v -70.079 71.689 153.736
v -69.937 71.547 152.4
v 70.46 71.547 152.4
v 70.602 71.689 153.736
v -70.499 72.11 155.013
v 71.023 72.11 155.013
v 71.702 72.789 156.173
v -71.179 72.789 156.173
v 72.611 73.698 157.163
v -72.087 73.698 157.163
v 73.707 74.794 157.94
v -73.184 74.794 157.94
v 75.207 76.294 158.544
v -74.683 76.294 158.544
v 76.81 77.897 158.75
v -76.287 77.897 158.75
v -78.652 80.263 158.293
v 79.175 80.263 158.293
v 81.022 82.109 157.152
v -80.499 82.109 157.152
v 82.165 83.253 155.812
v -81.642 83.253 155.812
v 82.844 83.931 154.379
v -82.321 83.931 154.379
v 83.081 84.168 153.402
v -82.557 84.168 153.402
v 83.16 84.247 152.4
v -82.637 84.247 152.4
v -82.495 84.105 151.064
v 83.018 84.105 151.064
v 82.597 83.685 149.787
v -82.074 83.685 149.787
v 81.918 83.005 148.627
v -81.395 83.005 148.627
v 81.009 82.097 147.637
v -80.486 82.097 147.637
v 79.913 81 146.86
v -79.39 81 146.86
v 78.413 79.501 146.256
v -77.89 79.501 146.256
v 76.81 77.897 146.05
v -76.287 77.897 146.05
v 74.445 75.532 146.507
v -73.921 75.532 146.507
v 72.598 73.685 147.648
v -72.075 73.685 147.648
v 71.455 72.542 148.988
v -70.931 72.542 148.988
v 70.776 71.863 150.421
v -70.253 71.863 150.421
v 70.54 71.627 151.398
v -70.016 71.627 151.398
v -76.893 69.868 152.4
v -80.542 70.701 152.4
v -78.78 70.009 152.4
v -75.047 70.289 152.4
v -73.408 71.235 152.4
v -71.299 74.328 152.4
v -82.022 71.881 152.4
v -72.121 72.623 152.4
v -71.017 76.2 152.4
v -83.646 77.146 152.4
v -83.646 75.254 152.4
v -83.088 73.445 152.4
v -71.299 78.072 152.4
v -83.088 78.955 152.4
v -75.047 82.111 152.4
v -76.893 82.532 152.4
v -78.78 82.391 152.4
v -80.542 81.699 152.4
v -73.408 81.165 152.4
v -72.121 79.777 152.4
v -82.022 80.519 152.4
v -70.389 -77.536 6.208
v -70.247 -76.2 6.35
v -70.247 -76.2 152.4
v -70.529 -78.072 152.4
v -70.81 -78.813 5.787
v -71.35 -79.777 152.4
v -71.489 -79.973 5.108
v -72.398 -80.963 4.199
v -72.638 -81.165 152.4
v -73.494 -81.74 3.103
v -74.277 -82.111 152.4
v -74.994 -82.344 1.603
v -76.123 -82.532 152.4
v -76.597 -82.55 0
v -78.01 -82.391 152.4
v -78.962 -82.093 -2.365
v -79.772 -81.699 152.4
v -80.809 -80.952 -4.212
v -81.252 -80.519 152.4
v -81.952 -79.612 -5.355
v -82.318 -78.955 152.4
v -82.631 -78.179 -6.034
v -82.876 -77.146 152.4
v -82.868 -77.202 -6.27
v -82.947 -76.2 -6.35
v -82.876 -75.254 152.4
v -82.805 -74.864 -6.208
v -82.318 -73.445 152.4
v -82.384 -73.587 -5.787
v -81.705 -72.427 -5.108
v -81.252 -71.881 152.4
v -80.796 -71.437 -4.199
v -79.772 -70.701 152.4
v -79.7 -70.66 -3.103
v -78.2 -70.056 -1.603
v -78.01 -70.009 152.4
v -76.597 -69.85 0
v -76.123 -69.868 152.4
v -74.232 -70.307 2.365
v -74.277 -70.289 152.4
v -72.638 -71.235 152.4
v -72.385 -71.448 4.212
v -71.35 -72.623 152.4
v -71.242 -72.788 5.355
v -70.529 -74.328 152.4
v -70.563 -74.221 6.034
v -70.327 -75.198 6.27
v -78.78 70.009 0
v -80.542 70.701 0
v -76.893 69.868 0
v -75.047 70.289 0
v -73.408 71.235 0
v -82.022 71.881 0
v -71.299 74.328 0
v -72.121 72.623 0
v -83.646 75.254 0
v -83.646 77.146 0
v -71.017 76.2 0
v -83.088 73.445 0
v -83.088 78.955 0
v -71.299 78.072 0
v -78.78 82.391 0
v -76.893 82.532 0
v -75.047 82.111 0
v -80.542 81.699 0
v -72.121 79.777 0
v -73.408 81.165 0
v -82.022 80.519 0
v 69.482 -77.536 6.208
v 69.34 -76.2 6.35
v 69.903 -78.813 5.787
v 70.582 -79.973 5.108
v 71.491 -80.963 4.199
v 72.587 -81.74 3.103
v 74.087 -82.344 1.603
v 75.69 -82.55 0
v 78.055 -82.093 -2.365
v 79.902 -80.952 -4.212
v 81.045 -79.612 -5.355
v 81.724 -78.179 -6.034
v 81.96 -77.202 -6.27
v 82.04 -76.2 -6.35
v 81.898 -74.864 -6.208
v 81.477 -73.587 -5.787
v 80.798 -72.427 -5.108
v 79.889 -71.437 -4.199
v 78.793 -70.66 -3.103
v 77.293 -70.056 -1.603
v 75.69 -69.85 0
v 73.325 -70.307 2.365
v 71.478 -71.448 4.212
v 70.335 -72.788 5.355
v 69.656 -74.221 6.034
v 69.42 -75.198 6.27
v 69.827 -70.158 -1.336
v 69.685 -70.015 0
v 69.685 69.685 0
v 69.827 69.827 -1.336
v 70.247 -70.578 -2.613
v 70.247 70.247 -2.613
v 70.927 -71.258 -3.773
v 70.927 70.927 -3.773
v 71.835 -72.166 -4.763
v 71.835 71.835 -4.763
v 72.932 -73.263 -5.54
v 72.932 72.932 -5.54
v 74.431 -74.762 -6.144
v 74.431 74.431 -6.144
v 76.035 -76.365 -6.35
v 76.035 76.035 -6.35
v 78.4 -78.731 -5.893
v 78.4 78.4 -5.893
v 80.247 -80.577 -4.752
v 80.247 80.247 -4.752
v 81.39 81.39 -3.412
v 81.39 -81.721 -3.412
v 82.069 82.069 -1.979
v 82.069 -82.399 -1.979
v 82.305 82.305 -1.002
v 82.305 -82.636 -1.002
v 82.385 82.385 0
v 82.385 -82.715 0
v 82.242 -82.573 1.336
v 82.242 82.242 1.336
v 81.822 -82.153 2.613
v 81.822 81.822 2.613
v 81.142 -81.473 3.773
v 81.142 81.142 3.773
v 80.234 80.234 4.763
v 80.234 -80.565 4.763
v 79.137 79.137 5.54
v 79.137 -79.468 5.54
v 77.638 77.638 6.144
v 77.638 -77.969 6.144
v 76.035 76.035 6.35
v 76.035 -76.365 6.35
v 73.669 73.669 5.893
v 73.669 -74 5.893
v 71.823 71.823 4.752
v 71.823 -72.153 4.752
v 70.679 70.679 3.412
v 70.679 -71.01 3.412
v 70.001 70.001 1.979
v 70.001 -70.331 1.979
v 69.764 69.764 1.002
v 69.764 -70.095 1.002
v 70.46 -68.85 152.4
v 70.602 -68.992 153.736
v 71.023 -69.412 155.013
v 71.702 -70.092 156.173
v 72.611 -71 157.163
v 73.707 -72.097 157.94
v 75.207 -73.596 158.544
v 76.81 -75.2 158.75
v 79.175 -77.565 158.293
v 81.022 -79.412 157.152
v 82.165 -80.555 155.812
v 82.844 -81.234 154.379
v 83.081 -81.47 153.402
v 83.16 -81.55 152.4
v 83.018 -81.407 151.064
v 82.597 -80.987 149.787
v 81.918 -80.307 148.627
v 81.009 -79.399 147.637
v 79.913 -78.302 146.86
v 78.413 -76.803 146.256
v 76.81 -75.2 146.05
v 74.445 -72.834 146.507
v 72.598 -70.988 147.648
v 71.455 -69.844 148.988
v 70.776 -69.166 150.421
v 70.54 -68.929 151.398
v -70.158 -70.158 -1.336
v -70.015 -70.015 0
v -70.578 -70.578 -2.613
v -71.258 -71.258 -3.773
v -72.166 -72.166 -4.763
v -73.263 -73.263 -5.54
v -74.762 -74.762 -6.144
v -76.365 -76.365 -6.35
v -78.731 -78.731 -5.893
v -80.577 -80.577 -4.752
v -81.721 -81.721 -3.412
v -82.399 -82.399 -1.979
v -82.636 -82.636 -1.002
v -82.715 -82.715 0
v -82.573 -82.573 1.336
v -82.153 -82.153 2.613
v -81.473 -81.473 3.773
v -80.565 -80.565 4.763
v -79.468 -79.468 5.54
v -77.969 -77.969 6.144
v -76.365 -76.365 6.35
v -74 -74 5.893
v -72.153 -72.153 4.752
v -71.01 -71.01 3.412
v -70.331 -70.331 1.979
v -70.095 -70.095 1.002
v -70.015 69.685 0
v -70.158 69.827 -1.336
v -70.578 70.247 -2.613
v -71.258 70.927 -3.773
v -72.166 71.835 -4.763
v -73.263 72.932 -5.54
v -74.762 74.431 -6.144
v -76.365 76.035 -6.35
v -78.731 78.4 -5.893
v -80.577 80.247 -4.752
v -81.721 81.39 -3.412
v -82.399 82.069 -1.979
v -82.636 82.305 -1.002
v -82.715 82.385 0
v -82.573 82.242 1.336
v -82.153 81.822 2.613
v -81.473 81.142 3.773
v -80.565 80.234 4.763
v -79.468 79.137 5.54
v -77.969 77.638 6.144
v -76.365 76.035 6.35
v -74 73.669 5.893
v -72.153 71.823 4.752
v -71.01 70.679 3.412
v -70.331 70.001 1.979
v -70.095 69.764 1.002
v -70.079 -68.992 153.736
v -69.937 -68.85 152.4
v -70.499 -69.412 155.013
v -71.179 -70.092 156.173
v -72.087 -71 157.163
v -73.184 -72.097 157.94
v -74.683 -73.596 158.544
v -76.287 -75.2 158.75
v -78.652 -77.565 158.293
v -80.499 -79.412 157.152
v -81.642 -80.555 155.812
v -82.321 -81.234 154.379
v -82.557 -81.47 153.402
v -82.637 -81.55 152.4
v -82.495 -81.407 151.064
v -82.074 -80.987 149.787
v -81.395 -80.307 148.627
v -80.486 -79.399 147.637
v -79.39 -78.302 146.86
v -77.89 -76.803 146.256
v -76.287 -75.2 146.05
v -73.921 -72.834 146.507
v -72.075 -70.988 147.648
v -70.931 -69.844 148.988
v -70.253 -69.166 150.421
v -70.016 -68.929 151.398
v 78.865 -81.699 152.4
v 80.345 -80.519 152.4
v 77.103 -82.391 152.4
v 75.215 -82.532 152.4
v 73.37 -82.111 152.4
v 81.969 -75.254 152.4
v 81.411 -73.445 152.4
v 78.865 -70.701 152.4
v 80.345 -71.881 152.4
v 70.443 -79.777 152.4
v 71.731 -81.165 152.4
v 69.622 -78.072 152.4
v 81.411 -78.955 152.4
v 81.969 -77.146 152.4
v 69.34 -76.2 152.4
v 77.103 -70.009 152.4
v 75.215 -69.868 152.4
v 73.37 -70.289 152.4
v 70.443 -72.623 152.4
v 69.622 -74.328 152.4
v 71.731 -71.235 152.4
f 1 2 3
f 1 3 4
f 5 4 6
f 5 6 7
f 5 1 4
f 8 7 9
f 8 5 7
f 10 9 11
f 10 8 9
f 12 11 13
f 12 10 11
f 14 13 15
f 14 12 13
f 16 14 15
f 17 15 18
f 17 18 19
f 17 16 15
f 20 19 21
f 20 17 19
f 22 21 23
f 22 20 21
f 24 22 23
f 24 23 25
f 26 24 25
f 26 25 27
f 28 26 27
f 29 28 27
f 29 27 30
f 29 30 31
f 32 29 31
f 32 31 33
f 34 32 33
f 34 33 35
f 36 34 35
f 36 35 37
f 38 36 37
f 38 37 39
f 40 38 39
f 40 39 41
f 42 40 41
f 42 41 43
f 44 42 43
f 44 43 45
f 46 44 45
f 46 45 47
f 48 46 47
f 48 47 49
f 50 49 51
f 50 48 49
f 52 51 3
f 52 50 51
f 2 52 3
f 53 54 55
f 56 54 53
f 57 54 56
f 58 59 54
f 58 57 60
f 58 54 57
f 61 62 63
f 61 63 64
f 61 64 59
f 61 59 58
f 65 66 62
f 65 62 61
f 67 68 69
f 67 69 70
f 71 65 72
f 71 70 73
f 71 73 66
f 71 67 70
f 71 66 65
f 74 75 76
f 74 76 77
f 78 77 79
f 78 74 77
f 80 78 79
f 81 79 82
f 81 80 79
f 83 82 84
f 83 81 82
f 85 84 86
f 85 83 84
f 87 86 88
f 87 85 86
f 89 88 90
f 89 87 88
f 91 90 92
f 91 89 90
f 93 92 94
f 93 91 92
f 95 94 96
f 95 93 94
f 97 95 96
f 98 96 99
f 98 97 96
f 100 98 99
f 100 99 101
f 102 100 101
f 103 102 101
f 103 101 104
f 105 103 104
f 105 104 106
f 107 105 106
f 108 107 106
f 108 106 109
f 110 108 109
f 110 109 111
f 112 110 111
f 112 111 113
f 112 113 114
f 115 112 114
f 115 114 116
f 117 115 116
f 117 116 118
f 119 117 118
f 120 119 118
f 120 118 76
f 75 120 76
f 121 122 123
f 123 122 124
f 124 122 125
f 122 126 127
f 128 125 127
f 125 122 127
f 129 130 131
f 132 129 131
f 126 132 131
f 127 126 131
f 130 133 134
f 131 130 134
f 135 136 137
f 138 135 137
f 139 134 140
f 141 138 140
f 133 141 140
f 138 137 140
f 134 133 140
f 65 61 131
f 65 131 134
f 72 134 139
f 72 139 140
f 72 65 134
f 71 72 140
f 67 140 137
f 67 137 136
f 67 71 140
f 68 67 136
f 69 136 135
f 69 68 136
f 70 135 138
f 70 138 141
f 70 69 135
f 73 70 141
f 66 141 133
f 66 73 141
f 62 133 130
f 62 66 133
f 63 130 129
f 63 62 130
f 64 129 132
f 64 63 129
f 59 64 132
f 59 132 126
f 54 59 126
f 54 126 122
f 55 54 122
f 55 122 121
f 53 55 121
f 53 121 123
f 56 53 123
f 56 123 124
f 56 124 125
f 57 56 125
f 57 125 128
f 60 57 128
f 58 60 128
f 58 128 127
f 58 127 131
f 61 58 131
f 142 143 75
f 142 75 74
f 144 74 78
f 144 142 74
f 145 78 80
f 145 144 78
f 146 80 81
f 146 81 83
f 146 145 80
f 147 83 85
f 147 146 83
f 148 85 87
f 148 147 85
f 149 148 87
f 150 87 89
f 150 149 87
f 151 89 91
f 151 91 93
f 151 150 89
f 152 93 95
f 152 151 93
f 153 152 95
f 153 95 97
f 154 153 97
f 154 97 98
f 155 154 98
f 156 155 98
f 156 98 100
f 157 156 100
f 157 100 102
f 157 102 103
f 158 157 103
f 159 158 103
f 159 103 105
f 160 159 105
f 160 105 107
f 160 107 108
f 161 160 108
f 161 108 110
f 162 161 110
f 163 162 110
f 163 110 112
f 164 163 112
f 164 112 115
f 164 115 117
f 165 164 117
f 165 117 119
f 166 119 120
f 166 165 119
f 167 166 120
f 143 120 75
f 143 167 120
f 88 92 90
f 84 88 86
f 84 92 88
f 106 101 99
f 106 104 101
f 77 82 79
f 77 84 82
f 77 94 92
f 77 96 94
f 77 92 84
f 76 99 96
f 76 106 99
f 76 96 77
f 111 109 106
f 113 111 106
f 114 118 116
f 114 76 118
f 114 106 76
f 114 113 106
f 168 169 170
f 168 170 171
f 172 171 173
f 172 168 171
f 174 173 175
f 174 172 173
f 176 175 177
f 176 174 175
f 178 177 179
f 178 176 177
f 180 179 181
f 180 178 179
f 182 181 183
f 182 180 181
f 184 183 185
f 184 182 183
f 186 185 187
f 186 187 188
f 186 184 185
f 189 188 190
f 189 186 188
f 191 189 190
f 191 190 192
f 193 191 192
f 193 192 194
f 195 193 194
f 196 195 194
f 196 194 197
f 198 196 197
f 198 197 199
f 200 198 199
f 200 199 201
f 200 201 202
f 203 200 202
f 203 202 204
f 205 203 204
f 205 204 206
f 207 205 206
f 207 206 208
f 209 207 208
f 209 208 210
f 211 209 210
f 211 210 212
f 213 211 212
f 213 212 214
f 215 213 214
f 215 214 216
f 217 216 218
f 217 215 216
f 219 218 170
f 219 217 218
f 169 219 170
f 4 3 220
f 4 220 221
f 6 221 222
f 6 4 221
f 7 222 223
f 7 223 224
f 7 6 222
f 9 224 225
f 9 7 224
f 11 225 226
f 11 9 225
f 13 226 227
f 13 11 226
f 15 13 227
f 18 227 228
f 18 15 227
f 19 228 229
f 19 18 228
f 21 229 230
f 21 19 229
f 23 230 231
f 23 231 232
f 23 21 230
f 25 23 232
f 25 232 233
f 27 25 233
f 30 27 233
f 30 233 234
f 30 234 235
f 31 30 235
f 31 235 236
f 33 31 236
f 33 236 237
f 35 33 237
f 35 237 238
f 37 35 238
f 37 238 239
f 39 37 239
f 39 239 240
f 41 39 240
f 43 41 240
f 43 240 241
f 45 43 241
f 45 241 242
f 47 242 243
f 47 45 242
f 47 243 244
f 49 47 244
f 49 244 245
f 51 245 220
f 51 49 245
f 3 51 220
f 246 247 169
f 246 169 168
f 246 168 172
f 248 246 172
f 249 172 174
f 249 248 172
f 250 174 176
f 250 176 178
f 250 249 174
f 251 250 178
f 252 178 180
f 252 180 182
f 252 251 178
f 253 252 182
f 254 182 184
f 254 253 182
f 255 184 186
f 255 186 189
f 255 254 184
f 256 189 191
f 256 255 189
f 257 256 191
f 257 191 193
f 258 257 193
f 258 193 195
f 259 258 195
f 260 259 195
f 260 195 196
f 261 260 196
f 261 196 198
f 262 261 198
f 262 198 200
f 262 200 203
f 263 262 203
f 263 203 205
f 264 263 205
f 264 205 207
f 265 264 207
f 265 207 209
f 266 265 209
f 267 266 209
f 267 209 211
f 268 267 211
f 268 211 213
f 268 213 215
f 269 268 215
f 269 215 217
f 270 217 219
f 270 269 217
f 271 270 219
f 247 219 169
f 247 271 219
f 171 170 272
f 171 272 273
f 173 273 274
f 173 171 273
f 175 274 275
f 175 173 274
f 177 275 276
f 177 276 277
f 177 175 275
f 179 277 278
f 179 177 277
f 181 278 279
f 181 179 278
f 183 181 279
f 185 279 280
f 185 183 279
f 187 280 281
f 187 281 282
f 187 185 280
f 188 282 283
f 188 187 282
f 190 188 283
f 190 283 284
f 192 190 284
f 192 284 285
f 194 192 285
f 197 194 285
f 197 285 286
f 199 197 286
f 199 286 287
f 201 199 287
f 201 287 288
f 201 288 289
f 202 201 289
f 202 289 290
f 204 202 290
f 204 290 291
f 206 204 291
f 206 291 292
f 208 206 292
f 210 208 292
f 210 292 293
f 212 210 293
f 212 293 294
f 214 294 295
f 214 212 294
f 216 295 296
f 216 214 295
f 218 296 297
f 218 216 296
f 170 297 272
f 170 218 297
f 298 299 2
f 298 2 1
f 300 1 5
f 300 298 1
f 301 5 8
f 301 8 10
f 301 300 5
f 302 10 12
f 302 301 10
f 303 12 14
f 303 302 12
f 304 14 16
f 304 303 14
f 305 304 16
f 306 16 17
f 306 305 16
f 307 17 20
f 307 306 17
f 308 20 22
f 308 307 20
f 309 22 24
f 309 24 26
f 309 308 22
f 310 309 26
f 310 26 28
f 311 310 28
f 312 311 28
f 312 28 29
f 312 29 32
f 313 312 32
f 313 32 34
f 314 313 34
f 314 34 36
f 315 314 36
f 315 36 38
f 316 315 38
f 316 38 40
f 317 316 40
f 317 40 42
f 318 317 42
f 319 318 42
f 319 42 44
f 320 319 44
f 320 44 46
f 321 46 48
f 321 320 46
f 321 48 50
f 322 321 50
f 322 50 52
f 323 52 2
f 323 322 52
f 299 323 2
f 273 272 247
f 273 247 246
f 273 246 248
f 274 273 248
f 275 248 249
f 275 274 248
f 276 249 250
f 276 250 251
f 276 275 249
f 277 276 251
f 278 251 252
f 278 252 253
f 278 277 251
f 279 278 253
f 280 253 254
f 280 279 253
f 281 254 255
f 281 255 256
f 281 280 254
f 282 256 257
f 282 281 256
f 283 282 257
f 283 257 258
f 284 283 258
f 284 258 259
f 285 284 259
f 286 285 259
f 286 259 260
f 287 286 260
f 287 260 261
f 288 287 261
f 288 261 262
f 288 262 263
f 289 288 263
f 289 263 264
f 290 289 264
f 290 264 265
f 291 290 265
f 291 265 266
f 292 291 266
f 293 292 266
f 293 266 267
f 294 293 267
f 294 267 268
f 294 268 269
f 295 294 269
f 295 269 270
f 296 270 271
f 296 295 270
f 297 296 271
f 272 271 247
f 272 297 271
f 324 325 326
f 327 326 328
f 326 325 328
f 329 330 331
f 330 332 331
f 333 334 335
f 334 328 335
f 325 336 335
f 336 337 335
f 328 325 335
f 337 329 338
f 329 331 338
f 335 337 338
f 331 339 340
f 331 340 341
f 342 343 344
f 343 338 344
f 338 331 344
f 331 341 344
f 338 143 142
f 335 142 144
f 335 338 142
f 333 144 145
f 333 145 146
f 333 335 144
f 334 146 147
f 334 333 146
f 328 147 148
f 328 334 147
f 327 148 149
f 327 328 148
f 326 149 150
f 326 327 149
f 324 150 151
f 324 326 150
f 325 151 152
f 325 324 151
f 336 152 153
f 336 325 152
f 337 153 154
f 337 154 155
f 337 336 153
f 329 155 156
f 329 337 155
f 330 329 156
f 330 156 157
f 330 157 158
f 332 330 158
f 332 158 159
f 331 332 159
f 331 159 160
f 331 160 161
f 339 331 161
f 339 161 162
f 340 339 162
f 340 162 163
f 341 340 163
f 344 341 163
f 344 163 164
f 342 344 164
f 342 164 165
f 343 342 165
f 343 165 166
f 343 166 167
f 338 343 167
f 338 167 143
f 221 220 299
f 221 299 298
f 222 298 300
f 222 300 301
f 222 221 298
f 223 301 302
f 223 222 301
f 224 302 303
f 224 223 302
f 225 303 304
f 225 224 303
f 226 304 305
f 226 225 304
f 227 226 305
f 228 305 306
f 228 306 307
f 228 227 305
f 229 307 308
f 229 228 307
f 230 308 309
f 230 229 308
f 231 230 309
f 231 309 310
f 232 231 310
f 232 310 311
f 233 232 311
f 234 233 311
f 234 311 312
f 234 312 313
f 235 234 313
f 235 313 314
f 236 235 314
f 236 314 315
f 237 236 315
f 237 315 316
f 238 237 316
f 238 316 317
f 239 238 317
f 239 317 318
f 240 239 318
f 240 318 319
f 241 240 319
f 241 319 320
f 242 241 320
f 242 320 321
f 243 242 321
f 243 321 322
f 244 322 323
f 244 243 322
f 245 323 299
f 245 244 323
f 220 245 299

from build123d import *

# Parameters (mm, degrees)
F1_R  = 6.35
F6_R  = 6.35
F9_R  = 6.35
F13_R = 6.35


with BuildPart() as f2:
    # F2: sweep along a path in F0
    with BuildLine(Plane.XY) as f2_path:
        Line((-76.3653023233, 76.034690243), (76.0346976767, 76.034690243))
        Line((76.0346976767, 76.034690243), (76.0346976767, -76.365309757))
        Line((76.0346976767, -76.365309757), (-76.3653023233, -76.365309757))
        Line((-76.3653023233, -76.365309757), (-76.3653023233, 76.034690243))
    # F1 (on Front) → F2 (sweep)
    with BuildSketch(Plane.XZ):
        with Locations((-76.3653023233, 0)):
            Circle(F1_R)
    sweep(path=f2_path.line, transition=Transition.RIGHT)


with BuildPart() as f7:
    # F7: sweep along a path in F5
    with BuildLine(Plane.XZ.offset(-76.2)) as f7_path:
        Line((-77.3671647617, 0), (-77.3671647617, 152.4))
    # F6 (on Top) → F7 (sweep)
    with BuildSketch(Plane.XY):
        with Locations((-77.3671647617, 76.2)):
            Circle(F6_R)
    sweep(path=f7_path.line)


with BuildPart() as f10:
    # F10: sweep along a path in F8
    with BuildLine(Plane.XZ.offset(76.2)) as f10_path:
        Line((-76.5970647335, 152.4), (-76.5970647335, 0))
        Line((-76.5970647335, 0), (75.6899863482, 0))
        Line((75.6899863482, 0), (75.6899863482, 152.4))
    # F9 (on Top) → F10 (sweep)
    with BuildSketch(Plane.XY):
        with Locations((-76.5970647335, -76.2)):
            Circle(F9_R)
    sweep(path=f10_path.line, transition=Transition.RIGHT)


with BuildPart() as f14:
    # F14: sweep along a path in F12
    with BuildLine(Plane.XY.offset(152.4)) as f14_path:
        Line((-76.2867927551, -75.1996487379), (76.8100395799, -75.1996487379))
        Line((76.8100395799, -75.1996487379), (76.8100395799, 77.8971910477))
        Line((76.8100395799, 77.8971910477), (-76.2867927551, 77.8971910477))
        Line((-76.2867927551, 77.8971910477), (-76.2867927551, -75.1996487379))
    # F13 (on offset) → F14 (sweep)
    with BuildSketch(Plane.XZ.offset(-76.2)):
        with Locations((-76.2867927551, 152.4)):
            Circle(F13_R)
    sweep(path=f14_path.line, transition=Transition.RIGHT)


solid = Compound([f2.part, f7.part, f10.part, f14.part])
